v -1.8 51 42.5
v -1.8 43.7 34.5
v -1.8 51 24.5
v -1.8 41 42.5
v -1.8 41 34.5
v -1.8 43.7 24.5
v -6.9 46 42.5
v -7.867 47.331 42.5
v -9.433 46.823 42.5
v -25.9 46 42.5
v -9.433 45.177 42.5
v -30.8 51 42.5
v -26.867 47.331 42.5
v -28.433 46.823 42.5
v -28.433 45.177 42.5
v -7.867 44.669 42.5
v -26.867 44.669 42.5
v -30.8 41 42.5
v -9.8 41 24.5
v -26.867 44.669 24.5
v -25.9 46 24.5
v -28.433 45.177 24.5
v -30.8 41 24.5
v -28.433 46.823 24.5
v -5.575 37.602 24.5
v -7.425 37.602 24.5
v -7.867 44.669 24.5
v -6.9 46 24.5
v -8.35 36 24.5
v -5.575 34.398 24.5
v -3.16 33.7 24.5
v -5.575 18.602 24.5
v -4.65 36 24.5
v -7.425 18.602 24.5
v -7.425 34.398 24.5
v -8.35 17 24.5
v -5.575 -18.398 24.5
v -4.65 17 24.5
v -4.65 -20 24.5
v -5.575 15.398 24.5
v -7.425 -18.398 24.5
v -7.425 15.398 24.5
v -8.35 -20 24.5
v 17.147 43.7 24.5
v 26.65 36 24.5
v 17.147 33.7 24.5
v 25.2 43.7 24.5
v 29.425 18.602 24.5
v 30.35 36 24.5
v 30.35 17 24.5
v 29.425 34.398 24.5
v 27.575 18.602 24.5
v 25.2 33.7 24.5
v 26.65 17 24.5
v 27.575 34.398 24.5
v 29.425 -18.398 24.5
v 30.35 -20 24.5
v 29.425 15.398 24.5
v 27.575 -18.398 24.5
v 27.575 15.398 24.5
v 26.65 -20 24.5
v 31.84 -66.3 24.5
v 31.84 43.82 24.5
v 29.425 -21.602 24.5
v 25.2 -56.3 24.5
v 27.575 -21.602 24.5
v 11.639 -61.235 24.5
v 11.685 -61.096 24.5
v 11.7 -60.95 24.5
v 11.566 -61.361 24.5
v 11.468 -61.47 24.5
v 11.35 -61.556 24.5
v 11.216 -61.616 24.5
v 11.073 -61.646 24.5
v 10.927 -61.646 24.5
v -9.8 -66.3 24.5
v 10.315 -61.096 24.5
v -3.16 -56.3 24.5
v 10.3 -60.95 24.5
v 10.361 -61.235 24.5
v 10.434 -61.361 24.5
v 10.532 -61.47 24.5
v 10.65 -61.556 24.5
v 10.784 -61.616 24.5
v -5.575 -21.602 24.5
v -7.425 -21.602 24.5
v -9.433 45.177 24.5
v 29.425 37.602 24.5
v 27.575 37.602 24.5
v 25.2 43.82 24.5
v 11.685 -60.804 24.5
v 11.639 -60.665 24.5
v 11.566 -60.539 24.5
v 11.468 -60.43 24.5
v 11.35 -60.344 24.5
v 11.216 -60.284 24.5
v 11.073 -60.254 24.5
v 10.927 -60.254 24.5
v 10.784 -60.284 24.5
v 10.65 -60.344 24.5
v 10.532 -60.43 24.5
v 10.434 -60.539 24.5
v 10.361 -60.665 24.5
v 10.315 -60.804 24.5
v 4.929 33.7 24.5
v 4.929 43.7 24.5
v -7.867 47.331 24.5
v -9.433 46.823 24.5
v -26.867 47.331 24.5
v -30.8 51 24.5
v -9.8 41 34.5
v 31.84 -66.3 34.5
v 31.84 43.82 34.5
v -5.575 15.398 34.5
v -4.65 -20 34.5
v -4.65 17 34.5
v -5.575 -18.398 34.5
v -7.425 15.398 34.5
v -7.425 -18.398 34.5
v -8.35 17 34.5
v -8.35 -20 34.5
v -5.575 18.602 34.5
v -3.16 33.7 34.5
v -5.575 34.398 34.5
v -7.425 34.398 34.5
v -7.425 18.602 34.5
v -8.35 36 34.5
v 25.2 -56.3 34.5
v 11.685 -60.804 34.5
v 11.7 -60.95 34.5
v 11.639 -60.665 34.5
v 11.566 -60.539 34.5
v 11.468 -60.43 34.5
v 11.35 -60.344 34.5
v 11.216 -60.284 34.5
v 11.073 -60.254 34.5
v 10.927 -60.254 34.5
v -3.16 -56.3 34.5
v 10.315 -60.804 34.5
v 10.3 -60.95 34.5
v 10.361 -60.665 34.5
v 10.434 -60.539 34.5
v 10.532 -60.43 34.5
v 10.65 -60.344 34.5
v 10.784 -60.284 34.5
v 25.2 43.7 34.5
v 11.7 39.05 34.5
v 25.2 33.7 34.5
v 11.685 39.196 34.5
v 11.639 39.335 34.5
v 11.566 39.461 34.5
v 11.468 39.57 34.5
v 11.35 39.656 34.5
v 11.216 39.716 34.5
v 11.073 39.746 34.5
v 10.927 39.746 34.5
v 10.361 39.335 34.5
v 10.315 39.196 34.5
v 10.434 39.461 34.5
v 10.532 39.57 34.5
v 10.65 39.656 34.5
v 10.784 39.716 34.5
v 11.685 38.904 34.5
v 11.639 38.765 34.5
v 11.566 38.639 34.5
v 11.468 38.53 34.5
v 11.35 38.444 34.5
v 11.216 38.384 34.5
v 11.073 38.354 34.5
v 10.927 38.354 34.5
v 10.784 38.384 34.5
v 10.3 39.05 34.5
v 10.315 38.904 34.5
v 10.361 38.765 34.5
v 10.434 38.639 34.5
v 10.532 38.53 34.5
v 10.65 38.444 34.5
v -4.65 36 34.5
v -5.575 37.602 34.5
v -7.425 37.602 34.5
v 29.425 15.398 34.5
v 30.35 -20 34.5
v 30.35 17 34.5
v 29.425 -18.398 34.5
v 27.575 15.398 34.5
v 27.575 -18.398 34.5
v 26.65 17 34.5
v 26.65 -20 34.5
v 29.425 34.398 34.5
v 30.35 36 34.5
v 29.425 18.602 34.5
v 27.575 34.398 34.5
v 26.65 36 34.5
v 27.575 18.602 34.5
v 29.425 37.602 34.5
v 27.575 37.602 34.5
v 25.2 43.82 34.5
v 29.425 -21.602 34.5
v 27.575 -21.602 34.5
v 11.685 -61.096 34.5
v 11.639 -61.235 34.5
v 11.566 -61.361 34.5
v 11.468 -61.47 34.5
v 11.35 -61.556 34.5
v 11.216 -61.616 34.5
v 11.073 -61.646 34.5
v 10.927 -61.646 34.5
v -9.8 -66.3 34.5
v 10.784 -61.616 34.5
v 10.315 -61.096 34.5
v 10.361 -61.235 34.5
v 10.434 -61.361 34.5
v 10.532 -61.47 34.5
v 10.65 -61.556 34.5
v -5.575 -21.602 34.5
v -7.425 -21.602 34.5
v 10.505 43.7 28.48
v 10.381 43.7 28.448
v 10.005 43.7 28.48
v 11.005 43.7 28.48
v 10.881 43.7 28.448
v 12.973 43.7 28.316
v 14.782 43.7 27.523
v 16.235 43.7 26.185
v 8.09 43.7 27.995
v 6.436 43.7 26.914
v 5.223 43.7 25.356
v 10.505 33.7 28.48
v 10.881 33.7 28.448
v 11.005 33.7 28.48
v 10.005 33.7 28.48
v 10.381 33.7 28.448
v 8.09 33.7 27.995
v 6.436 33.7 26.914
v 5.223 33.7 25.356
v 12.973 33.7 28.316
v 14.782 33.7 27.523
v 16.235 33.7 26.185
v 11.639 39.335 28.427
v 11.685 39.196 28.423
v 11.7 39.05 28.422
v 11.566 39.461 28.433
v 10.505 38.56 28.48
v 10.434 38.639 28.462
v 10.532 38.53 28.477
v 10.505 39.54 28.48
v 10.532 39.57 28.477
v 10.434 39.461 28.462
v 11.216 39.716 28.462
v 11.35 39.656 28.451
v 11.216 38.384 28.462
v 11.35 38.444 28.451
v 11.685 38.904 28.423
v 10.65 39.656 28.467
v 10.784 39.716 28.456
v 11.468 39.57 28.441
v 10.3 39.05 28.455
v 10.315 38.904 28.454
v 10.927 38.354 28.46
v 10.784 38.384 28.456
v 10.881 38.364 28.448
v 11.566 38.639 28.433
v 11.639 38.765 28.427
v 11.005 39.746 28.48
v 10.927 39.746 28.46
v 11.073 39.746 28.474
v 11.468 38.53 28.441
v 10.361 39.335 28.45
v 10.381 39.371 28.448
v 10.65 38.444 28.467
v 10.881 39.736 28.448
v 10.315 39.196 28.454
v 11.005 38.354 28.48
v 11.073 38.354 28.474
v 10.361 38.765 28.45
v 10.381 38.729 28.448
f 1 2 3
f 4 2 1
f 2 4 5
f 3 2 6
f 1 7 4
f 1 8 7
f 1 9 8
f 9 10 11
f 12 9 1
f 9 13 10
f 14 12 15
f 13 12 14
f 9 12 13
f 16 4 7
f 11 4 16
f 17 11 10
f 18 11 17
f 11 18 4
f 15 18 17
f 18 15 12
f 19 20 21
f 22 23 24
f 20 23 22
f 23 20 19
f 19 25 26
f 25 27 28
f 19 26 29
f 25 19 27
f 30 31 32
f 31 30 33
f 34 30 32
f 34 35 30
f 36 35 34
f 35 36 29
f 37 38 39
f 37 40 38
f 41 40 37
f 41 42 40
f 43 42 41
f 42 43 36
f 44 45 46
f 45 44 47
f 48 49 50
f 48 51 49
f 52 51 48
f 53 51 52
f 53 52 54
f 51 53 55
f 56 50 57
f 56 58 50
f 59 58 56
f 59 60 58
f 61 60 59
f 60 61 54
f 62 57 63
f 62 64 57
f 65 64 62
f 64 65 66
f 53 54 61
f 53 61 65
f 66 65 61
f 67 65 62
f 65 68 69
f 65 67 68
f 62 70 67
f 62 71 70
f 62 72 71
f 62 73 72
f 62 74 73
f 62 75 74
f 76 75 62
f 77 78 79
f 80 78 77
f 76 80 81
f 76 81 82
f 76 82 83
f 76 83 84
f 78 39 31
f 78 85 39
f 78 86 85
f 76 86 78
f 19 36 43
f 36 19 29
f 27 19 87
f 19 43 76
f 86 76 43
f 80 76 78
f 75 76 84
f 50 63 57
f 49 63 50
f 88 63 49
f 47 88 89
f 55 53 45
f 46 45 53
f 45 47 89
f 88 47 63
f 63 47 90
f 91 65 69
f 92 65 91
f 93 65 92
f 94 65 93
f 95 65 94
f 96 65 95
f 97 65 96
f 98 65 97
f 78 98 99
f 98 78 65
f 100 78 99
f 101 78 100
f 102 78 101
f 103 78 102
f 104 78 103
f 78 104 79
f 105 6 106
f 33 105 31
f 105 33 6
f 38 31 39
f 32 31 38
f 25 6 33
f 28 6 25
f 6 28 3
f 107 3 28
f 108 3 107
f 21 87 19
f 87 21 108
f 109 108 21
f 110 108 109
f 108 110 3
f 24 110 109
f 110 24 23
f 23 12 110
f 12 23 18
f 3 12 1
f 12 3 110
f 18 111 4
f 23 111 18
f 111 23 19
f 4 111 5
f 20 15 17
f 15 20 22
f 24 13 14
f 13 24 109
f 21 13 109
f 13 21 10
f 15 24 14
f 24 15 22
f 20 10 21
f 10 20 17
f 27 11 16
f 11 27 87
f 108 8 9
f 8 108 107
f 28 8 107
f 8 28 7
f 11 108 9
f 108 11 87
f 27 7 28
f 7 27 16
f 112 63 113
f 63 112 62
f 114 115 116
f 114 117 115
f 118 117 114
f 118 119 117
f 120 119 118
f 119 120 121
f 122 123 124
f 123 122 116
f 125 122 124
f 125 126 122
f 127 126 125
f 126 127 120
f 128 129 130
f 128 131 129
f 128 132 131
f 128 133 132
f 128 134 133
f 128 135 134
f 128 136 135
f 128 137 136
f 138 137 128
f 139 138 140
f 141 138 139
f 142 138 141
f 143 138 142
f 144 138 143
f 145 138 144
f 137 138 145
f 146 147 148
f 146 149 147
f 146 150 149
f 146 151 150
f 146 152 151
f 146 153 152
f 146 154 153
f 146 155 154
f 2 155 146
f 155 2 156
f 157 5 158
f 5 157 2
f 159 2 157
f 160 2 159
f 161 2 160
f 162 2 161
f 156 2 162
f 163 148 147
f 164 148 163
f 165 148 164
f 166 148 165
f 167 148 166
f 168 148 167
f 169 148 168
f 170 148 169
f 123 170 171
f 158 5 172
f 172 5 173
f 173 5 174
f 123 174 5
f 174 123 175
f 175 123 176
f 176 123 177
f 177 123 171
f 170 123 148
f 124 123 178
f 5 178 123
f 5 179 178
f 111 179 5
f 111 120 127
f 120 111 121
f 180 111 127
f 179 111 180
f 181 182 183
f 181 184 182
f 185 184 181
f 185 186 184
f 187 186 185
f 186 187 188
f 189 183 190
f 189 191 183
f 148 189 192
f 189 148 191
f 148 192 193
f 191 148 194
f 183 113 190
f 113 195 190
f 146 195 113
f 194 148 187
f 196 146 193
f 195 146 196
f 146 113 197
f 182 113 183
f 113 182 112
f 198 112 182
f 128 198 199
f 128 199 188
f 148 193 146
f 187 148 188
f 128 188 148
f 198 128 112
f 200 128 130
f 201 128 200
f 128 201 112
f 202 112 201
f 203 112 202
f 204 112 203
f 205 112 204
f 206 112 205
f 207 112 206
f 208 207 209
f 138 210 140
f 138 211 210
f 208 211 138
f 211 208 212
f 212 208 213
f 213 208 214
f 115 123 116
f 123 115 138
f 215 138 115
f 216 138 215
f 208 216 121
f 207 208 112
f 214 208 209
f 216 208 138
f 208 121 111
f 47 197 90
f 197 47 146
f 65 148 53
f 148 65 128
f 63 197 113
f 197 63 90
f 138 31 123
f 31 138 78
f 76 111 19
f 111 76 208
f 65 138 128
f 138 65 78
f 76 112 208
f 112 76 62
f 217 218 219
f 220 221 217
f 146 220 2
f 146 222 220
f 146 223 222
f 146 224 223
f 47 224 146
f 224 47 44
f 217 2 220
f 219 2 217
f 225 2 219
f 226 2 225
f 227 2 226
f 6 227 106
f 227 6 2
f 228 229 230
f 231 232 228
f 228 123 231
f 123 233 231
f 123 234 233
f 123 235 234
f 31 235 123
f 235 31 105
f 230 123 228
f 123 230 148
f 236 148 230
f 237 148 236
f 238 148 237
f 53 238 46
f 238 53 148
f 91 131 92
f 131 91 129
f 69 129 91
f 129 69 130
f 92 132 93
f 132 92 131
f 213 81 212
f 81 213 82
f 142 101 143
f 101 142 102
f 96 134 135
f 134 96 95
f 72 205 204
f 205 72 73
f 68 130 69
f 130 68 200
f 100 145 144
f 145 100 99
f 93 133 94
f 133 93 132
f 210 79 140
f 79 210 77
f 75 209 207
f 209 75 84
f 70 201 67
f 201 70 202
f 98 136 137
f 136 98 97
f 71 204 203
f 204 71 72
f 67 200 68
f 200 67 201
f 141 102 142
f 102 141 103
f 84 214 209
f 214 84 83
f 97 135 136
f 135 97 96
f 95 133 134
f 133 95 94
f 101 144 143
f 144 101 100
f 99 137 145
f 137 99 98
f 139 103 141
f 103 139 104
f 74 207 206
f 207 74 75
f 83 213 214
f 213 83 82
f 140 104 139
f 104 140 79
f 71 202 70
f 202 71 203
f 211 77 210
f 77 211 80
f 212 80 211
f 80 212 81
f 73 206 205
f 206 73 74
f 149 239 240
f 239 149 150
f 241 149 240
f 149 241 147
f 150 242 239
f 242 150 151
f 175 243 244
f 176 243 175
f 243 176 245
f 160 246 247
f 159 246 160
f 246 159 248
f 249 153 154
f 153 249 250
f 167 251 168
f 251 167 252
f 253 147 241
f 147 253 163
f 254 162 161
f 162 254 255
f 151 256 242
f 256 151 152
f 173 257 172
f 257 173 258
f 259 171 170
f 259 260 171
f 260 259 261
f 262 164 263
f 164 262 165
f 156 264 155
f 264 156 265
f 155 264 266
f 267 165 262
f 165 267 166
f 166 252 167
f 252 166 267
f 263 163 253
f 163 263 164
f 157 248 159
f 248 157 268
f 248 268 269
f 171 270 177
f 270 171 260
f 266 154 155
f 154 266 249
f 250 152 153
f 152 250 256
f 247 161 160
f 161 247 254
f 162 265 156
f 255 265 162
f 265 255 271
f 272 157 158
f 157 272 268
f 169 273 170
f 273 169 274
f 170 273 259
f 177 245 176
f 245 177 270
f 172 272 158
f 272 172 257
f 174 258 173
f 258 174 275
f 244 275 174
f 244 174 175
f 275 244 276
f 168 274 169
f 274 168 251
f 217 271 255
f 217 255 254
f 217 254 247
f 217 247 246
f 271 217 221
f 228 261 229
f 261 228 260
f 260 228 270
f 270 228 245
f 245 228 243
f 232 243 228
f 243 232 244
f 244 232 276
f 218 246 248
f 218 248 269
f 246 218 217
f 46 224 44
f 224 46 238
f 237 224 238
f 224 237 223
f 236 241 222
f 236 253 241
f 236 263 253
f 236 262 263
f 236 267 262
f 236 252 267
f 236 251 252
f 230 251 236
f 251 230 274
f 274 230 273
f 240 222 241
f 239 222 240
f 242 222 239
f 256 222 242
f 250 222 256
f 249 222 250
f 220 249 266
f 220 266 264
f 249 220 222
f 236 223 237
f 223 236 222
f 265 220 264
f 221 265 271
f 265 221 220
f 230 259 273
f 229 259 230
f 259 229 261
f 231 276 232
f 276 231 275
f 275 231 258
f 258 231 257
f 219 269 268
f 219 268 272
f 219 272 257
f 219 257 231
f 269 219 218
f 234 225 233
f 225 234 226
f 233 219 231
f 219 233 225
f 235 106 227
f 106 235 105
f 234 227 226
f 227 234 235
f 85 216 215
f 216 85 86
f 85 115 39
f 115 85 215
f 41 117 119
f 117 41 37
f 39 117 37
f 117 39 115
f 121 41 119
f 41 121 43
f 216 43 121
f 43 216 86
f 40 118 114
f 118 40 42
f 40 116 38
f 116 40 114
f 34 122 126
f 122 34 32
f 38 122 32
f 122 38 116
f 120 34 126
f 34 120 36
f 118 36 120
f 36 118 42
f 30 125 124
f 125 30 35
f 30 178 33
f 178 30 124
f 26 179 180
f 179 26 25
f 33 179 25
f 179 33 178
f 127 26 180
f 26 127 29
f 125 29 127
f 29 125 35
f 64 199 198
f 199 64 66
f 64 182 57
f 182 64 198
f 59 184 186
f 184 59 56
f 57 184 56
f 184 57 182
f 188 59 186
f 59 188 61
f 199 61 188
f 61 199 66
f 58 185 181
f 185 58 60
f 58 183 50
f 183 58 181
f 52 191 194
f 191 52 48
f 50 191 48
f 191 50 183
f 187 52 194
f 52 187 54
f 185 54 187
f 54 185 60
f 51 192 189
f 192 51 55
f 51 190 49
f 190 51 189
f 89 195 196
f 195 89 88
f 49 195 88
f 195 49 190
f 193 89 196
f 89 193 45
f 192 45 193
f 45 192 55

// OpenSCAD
//translate([-40+2,-25+18.8,3])import("/Users/richard/Documents/009Reprapcatcube010715/igus_sliders/TS_04_09_50_3.stl");

difference(){
translate([49.7,31,25])slider_wall_mod();
 translate([-6.5,-20,20]){translate([0,0,4.5])cylinder(r=3.7/2,h=30);translate([0,0,-20])cylinder(r=2.7/2,h=40);}
  translate([-6.5,17,20]){translate([0,0,4.5])cylinder(r=3.7/2,h=30);translate([0,0,-20])cylinder(r=2.7/2,h=40);}
  translate([-6.5,36,20]){translate([0,0,4.5])cylinder(r=3.7/2,h=30);translate([0,0,-20])cylinder(r=2.7/2,h=40);}
  translate([35,0,0]){
  translate([-6.5,-20,20]){translate([0,0,4.5])cylinder(r=3.7/2,h=30);translate([0,0,-20])cylinder(r=2.7/2,h=40);}
  translate([-6.5,17,20]){translate([0,0,4.5])cylinder(r=3.7/2,h=30);translate([0,0,-20])cylinder(r=2.7/2,h=40);}
  translate([-6.5,36,20]){translate([0,0,4.5])cylinder(r=3.7/2,h=30);translate([0,0,-20])cylinder(r=2.7/2,h=40);}
}
}




module slider_wall_mod(){
translate([-90,0,-0.5])difference(){
translate([0-7.5-10-32+56+3,-40+20+10+3-8+22+3,0])cube([10+15+10+10+32-48,10,6+3-5+14]);
translate([13,-36+(0*10)+48+3,0]){cylinder(r=2.8/2,h=1000);}
translate([13+19,-36+(0*10)+48+3,0]){cylinder(r=2.8/2,h=1000);}
}
difference(){
union(){
translate([25-47.5,17.32+1.38-14-87,-13.5+13]){
translate([-2,-35+25,0])cube([4.64+2,13.62+1+22+58.5+35-25,10]);
translate([-2-35,-35+25,0])cube([4.64+2,13.62+1+22+55+37-25,10]);
translate([-2-35,4-40+25-4,0])#cube([4.64+2+35,10,10]);
translate([-2-35,85,0])cube([4.64+2+30,10,10]);
}
}
translate([25-47.5-16.5-0.20+0.5,17.32+1.38-14-117-0.65+21+(20*5)-(20*5),-13.5+13-20])#cylinder(r=1.4/2,h=200,$fn=30);
translate([25-47.5-16.5-0.20+0.5,17.32+1.38-14-117-0.65+21+(20*5),-13.5+13-20])#cylinder(r=1.4/2,h=200,$fn=30);
translate([25-47.5-16.5-0.20+0.5,17.32+1.38-14-117-0.65+120+20,-13.5+13-20+18])rotate([90,0,0])cylinder(r=12/2,h=40);
translate([25-47.5-16.5-0.20+1,17.32+1.38-14-117-0.65+120+20,-13.5+13-20+18])rotate([90,0,0])cylinder(r=12/2,h=40);
translate([25-47.5-16.5-0.20,17.32+1.38-14-117-0.65+120+20,-13.5+13-20+18])rotate([90,0,0])cylinder(r=12/2,h=40);
}
}
